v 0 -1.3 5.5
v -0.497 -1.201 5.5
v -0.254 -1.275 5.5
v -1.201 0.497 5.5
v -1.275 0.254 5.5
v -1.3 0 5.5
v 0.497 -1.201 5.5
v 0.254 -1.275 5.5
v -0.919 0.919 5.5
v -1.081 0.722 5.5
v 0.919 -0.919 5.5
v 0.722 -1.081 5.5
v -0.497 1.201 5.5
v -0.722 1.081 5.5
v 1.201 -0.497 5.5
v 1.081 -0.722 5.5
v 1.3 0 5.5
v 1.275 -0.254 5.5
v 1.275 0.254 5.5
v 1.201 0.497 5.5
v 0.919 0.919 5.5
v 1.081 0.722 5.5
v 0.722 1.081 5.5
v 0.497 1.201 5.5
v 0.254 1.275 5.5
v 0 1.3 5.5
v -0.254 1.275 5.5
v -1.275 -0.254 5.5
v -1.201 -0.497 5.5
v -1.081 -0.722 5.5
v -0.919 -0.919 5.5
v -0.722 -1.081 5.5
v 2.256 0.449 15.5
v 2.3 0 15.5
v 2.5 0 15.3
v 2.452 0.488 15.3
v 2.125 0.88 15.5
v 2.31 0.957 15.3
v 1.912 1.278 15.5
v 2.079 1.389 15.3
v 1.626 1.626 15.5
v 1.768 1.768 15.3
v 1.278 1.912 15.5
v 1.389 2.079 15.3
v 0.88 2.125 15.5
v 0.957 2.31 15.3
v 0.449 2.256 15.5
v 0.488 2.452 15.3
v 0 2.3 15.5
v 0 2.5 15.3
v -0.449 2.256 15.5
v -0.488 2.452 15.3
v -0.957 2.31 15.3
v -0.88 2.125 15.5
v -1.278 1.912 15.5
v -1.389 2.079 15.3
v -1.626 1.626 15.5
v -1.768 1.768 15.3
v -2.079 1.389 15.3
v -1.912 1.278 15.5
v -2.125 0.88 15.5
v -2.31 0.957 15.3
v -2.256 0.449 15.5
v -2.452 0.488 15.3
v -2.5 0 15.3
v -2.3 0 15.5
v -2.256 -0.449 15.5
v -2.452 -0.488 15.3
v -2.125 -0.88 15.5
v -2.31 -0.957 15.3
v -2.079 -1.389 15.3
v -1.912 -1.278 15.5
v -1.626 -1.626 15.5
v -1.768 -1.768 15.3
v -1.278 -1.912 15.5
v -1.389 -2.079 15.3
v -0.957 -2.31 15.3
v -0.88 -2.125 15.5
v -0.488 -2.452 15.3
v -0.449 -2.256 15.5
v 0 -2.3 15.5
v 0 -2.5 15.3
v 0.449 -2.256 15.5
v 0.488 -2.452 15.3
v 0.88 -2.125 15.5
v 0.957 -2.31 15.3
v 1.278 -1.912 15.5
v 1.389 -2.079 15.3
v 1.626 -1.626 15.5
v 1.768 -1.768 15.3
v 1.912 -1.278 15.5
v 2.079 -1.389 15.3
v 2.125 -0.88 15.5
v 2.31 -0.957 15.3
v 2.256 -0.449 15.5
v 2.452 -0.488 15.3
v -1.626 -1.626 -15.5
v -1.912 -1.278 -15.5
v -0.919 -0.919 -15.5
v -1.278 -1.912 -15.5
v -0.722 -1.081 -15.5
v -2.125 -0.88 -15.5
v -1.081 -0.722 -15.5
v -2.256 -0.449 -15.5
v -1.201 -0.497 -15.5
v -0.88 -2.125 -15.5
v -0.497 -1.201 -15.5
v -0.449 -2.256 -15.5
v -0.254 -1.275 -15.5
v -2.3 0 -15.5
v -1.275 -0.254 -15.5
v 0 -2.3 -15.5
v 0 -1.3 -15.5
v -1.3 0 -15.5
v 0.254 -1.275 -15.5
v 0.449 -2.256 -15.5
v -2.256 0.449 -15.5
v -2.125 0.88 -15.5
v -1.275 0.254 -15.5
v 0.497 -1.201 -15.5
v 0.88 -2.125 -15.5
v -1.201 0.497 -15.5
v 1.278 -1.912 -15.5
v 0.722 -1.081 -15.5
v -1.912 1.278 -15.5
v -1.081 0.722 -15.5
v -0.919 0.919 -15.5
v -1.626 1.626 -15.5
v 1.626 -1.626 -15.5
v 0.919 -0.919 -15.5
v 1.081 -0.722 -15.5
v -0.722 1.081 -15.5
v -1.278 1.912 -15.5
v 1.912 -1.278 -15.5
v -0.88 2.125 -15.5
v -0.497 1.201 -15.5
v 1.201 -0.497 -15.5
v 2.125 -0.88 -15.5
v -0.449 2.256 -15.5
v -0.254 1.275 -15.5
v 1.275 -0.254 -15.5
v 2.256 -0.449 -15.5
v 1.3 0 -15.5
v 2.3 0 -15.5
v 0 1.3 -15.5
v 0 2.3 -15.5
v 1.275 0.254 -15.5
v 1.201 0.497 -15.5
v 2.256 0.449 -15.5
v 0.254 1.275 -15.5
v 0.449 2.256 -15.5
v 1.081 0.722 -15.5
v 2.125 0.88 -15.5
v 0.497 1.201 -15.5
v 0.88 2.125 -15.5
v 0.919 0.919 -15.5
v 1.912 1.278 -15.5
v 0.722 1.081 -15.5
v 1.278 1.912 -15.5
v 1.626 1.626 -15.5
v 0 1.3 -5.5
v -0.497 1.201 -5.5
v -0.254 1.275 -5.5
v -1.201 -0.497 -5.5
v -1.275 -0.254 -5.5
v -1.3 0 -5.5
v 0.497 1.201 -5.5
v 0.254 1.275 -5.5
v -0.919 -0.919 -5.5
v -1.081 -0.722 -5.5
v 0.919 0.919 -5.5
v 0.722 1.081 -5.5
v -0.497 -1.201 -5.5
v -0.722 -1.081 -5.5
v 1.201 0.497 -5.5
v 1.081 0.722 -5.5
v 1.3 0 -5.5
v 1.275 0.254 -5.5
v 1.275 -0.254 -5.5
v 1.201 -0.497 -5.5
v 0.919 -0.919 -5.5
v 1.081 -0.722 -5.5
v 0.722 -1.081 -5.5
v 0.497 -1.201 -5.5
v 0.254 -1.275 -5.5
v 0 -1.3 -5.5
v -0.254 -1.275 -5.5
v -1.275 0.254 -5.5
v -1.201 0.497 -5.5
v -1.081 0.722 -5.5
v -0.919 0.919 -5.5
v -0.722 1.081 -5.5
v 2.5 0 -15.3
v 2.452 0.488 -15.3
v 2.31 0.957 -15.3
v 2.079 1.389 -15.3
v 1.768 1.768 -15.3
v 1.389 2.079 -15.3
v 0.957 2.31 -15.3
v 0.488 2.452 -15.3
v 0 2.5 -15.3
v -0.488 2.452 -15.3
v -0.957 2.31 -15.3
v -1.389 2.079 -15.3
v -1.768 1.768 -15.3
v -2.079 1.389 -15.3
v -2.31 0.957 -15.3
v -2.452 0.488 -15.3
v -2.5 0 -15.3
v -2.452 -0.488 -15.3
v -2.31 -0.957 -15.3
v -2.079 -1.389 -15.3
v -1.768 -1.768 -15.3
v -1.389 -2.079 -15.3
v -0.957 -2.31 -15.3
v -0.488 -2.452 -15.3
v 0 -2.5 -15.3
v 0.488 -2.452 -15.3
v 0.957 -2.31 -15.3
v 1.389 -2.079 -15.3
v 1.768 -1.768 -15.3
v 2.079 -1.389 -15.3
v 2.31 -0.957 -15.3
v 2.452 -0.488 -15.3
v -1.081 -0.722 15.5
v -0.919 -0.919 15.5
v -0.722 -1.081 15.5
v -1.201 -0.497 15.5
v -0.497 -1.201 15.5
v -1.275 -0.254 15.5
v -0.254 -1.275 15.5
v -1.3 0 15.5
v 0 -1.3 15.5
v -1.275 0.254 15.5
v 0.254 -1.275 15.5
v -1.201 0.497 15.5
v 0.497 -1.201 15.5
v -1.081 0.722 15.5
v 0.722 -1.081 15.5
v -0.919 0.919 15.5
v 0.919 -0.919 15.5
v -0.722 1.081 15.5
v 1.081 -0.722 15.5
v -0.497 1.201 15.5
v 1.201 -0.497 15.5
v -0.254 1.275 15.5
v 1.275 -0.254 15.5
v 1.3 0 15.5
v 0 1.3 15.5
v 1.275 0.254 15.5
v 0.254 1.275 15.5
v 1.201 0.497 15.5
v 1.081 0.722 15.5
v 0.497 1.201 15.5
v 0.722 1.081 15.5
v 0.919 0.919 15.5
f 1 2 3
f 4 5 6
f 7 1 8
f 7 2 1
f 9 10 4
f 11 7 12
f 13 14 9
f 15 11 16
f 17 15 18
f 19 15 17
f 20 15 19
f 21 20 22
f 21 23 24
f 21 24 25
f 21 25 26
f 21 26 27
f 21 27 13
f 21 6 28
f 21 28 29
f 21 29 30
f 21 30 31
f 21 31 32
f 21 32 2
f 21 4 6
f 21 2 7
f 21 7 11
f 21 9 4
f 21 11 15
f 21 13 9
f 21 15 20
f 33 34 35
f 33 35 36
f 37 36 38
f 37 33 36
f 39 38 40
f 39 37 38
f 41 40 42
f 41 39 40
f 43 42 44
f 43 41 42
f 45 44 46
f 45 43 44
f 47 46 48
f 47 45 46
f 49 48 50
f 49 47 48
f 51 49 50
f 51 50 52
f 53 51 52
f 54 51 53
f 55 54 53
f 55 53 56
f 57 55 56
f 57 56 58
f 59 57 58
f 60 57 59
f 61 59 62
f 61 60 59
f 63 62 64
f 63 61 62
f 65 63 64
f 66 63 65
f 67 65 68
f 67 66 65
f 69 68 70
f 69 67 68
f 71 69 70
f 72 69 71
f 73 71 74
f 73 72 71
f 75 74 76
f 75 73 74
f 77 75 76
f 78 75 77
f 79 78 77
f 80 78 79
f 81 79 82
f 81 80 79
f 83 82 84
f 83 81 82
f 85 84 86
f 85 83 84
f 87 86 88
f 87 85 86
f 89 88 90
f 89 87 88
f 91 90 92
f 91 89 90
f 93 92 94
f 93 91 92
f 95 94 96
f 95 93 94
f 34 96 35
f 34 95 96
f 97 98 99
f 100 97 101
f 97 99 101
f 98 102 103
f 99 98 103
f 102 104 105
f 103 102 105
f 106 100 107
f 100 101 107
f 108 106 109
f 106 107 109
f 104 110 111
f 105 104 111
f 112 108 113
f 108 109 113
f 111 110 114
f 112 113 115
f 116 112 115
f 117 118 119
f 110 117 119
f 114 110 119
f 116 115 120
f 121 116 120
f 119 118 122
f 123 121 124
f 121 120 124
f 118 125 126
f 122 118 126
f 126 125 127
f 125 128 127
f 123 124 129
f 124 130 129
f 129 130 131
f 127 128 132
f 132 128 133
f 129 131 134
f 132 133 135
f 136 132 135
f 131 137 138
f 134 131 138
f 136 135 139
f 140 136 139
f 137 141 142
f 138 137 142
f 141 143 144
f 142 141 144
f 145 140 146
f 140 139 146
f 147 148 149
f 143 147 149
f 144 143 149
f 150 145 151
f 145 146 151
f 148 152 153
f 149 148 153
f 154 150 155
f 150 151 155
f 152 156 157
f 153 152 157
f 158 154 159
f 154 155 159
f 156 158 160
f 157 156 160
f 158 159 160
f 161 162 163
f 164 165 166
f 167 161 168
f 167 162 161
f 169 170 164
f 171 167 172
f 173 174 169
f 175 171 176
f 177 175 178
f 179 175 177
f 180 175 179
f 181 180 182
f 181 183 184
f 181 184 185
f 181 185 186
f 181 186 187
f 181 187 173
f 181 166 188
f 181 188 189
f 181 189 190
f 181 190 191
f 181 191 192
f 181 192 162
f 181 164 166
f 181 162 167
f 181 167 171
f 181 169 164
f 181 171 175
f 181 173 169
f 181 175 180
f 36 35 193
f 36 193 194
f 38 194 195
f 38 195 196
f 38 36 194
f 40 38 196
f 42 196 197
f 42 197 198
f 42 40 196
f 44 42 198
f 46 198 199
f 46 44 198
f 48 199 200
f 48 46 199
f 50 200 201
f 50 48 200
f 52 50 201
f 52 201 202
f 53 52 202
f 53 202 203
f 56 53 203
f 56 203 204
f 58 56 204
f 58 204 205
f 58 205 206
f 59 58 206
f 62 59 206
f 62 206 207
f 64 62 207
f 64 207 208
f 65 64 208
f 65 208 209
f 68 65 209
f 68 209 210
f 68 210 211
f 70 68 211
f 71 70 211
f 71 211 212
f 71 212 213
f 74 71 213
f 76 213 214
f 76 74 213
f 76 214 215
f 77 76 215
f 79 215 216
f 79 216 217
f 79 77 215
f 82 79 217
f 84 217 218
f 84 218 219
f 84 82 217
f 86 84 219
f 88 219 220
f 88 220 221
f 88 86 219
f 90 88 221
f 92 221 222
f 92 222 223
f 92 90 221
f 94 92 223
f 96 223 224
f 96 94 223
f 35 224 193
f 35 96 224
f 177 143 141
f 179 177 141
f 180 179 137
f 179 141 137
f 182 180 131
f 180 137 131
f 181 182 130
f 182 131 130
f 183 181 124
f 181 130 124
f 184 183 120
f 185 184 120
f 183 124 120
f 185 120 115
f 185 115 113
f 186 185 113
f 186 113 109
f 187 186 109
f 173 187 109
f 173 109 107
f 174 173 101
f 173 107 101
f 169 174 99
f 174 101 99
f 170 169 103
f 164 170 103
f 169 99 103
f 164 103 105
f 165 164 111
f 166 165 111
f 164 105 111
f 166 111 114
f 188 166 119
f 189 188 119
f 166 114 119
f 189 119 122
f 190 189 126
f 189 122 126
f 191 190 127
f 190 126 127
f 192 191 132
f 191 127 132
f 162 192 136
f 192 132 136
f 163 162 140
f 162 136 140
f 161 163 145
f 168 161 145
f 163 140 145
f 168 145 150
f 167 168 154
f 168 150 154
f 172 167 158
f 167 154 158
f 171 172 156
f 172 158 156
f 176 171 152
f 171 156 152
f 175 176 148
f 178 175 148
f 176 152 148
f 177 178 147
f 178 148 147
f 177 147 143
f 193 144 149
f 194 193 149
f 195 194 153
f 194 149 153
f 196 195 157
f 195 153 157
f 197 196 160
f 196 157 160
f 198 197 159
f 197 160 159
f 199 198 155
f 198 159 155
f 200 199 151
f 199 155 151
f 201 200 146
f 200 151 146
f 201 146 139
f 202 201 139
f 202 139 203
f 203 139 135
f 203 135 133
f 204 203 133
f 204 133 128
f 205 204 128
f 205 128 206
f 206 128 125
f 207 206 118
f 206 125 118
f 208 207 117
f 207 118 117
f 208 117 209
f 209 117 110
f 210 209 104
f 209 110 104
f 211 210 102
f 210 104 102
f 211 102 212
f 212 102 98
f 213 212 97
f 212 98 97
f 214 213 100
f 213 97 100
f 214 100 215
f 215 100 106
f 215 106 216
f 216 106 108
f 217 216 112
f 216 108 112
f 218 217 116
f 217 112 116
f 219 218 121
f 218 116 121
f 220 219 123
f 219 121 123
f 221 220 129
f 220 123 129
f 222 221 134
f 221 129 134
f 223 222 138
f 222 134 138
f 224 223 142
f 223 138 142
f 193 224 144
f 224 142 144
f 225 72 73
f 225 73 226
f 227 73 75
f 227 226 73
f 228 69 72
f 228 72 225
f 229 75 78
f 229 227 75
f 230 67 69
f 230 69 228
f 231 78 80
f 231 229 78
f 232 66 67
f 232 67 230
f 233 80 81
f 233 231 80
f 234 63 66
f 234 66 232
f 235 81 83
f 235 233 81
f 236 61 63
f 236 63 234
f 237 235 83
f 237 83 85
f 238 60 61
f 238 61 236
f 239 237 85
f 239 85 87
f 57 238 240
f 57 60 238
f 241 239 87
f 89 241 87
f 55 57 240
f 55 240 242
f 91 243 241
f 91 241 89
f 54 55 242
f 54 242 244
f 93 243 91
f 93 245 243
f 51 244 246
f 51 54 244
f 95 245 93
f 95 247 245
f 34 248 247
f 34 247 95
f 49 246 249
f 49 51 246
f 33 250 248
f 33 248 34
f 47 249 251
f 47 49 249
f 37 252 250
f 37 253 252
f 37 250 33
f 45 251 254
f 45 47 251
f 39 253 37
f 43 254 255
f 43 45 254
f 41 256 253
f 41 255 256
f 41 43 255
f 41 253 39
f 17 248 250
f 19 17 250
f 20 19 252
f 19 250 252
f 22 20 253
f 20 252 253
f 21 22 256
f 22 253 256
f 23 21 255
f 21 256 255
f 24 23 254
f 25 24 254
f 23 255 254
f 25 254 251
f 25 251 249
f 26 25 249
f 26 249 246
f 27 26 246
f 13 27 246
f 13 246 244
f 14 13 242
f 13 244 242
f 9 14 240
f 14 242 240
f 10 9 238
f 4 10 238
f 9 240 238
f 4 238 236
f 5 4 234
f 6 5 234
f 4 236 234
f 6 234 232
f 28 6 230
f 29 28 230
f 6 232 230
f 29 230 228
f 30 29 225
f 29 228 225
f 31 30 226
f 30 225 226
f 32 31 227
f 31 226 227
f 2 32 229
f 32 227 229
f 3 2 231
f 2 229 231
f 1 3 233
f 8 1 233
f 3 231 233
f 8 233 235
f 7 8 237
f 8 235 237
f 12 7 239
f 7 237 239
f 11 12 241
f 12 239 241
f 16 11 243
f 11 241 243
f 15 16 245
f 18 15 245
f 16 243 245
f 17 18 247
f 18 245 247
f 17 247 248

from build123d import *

# Parameters (mm, degrees)
F0_R     = 2.5
F1_DEPTH = 15.5
F2_R     = 1.3
F3_DEPTH = 10
F4_R     = 1.3
F5_DEPTH = 10
F6_SIZE  = 0.2


with BuildPart() as f1:
    # F0 (on Top) → F1 (new body, symmetric)
    with BuildSketch(Plane.XY):
        Circle(F0_R)
    extrude(amount=F1_DEPTH, both=True)

    # F2 (on face) → F3 (cut)
    with BuildSketch(Plane.XY.offset(15.5)):
        Circle(F2_R)
    extrude(amount=-F3_DEPTH, mode=Mode.SUBTRACT)

    # F4 (on face) → F5 (cut)
    with BuildSketch(Plane(origin=(0, 0, -15.5), x_dir=(1, 0, 0), z_dir=(0, 0, -1))):
        Circle(F4_R)
    extrude(amount=-F5_DEPTH, mode=Mode.SUBTRACT)

    # F6
    f6_edges = [f1.edges().sort_by_distance(p)[0] for p in [
        (-2.5, 0, -15.5),
        (2.5, 0, 0),
        (-2.5, 0, 15.5),
    ]]
    chamfer(f6_edges, length=F6_SIZE)


solid = f1.part
